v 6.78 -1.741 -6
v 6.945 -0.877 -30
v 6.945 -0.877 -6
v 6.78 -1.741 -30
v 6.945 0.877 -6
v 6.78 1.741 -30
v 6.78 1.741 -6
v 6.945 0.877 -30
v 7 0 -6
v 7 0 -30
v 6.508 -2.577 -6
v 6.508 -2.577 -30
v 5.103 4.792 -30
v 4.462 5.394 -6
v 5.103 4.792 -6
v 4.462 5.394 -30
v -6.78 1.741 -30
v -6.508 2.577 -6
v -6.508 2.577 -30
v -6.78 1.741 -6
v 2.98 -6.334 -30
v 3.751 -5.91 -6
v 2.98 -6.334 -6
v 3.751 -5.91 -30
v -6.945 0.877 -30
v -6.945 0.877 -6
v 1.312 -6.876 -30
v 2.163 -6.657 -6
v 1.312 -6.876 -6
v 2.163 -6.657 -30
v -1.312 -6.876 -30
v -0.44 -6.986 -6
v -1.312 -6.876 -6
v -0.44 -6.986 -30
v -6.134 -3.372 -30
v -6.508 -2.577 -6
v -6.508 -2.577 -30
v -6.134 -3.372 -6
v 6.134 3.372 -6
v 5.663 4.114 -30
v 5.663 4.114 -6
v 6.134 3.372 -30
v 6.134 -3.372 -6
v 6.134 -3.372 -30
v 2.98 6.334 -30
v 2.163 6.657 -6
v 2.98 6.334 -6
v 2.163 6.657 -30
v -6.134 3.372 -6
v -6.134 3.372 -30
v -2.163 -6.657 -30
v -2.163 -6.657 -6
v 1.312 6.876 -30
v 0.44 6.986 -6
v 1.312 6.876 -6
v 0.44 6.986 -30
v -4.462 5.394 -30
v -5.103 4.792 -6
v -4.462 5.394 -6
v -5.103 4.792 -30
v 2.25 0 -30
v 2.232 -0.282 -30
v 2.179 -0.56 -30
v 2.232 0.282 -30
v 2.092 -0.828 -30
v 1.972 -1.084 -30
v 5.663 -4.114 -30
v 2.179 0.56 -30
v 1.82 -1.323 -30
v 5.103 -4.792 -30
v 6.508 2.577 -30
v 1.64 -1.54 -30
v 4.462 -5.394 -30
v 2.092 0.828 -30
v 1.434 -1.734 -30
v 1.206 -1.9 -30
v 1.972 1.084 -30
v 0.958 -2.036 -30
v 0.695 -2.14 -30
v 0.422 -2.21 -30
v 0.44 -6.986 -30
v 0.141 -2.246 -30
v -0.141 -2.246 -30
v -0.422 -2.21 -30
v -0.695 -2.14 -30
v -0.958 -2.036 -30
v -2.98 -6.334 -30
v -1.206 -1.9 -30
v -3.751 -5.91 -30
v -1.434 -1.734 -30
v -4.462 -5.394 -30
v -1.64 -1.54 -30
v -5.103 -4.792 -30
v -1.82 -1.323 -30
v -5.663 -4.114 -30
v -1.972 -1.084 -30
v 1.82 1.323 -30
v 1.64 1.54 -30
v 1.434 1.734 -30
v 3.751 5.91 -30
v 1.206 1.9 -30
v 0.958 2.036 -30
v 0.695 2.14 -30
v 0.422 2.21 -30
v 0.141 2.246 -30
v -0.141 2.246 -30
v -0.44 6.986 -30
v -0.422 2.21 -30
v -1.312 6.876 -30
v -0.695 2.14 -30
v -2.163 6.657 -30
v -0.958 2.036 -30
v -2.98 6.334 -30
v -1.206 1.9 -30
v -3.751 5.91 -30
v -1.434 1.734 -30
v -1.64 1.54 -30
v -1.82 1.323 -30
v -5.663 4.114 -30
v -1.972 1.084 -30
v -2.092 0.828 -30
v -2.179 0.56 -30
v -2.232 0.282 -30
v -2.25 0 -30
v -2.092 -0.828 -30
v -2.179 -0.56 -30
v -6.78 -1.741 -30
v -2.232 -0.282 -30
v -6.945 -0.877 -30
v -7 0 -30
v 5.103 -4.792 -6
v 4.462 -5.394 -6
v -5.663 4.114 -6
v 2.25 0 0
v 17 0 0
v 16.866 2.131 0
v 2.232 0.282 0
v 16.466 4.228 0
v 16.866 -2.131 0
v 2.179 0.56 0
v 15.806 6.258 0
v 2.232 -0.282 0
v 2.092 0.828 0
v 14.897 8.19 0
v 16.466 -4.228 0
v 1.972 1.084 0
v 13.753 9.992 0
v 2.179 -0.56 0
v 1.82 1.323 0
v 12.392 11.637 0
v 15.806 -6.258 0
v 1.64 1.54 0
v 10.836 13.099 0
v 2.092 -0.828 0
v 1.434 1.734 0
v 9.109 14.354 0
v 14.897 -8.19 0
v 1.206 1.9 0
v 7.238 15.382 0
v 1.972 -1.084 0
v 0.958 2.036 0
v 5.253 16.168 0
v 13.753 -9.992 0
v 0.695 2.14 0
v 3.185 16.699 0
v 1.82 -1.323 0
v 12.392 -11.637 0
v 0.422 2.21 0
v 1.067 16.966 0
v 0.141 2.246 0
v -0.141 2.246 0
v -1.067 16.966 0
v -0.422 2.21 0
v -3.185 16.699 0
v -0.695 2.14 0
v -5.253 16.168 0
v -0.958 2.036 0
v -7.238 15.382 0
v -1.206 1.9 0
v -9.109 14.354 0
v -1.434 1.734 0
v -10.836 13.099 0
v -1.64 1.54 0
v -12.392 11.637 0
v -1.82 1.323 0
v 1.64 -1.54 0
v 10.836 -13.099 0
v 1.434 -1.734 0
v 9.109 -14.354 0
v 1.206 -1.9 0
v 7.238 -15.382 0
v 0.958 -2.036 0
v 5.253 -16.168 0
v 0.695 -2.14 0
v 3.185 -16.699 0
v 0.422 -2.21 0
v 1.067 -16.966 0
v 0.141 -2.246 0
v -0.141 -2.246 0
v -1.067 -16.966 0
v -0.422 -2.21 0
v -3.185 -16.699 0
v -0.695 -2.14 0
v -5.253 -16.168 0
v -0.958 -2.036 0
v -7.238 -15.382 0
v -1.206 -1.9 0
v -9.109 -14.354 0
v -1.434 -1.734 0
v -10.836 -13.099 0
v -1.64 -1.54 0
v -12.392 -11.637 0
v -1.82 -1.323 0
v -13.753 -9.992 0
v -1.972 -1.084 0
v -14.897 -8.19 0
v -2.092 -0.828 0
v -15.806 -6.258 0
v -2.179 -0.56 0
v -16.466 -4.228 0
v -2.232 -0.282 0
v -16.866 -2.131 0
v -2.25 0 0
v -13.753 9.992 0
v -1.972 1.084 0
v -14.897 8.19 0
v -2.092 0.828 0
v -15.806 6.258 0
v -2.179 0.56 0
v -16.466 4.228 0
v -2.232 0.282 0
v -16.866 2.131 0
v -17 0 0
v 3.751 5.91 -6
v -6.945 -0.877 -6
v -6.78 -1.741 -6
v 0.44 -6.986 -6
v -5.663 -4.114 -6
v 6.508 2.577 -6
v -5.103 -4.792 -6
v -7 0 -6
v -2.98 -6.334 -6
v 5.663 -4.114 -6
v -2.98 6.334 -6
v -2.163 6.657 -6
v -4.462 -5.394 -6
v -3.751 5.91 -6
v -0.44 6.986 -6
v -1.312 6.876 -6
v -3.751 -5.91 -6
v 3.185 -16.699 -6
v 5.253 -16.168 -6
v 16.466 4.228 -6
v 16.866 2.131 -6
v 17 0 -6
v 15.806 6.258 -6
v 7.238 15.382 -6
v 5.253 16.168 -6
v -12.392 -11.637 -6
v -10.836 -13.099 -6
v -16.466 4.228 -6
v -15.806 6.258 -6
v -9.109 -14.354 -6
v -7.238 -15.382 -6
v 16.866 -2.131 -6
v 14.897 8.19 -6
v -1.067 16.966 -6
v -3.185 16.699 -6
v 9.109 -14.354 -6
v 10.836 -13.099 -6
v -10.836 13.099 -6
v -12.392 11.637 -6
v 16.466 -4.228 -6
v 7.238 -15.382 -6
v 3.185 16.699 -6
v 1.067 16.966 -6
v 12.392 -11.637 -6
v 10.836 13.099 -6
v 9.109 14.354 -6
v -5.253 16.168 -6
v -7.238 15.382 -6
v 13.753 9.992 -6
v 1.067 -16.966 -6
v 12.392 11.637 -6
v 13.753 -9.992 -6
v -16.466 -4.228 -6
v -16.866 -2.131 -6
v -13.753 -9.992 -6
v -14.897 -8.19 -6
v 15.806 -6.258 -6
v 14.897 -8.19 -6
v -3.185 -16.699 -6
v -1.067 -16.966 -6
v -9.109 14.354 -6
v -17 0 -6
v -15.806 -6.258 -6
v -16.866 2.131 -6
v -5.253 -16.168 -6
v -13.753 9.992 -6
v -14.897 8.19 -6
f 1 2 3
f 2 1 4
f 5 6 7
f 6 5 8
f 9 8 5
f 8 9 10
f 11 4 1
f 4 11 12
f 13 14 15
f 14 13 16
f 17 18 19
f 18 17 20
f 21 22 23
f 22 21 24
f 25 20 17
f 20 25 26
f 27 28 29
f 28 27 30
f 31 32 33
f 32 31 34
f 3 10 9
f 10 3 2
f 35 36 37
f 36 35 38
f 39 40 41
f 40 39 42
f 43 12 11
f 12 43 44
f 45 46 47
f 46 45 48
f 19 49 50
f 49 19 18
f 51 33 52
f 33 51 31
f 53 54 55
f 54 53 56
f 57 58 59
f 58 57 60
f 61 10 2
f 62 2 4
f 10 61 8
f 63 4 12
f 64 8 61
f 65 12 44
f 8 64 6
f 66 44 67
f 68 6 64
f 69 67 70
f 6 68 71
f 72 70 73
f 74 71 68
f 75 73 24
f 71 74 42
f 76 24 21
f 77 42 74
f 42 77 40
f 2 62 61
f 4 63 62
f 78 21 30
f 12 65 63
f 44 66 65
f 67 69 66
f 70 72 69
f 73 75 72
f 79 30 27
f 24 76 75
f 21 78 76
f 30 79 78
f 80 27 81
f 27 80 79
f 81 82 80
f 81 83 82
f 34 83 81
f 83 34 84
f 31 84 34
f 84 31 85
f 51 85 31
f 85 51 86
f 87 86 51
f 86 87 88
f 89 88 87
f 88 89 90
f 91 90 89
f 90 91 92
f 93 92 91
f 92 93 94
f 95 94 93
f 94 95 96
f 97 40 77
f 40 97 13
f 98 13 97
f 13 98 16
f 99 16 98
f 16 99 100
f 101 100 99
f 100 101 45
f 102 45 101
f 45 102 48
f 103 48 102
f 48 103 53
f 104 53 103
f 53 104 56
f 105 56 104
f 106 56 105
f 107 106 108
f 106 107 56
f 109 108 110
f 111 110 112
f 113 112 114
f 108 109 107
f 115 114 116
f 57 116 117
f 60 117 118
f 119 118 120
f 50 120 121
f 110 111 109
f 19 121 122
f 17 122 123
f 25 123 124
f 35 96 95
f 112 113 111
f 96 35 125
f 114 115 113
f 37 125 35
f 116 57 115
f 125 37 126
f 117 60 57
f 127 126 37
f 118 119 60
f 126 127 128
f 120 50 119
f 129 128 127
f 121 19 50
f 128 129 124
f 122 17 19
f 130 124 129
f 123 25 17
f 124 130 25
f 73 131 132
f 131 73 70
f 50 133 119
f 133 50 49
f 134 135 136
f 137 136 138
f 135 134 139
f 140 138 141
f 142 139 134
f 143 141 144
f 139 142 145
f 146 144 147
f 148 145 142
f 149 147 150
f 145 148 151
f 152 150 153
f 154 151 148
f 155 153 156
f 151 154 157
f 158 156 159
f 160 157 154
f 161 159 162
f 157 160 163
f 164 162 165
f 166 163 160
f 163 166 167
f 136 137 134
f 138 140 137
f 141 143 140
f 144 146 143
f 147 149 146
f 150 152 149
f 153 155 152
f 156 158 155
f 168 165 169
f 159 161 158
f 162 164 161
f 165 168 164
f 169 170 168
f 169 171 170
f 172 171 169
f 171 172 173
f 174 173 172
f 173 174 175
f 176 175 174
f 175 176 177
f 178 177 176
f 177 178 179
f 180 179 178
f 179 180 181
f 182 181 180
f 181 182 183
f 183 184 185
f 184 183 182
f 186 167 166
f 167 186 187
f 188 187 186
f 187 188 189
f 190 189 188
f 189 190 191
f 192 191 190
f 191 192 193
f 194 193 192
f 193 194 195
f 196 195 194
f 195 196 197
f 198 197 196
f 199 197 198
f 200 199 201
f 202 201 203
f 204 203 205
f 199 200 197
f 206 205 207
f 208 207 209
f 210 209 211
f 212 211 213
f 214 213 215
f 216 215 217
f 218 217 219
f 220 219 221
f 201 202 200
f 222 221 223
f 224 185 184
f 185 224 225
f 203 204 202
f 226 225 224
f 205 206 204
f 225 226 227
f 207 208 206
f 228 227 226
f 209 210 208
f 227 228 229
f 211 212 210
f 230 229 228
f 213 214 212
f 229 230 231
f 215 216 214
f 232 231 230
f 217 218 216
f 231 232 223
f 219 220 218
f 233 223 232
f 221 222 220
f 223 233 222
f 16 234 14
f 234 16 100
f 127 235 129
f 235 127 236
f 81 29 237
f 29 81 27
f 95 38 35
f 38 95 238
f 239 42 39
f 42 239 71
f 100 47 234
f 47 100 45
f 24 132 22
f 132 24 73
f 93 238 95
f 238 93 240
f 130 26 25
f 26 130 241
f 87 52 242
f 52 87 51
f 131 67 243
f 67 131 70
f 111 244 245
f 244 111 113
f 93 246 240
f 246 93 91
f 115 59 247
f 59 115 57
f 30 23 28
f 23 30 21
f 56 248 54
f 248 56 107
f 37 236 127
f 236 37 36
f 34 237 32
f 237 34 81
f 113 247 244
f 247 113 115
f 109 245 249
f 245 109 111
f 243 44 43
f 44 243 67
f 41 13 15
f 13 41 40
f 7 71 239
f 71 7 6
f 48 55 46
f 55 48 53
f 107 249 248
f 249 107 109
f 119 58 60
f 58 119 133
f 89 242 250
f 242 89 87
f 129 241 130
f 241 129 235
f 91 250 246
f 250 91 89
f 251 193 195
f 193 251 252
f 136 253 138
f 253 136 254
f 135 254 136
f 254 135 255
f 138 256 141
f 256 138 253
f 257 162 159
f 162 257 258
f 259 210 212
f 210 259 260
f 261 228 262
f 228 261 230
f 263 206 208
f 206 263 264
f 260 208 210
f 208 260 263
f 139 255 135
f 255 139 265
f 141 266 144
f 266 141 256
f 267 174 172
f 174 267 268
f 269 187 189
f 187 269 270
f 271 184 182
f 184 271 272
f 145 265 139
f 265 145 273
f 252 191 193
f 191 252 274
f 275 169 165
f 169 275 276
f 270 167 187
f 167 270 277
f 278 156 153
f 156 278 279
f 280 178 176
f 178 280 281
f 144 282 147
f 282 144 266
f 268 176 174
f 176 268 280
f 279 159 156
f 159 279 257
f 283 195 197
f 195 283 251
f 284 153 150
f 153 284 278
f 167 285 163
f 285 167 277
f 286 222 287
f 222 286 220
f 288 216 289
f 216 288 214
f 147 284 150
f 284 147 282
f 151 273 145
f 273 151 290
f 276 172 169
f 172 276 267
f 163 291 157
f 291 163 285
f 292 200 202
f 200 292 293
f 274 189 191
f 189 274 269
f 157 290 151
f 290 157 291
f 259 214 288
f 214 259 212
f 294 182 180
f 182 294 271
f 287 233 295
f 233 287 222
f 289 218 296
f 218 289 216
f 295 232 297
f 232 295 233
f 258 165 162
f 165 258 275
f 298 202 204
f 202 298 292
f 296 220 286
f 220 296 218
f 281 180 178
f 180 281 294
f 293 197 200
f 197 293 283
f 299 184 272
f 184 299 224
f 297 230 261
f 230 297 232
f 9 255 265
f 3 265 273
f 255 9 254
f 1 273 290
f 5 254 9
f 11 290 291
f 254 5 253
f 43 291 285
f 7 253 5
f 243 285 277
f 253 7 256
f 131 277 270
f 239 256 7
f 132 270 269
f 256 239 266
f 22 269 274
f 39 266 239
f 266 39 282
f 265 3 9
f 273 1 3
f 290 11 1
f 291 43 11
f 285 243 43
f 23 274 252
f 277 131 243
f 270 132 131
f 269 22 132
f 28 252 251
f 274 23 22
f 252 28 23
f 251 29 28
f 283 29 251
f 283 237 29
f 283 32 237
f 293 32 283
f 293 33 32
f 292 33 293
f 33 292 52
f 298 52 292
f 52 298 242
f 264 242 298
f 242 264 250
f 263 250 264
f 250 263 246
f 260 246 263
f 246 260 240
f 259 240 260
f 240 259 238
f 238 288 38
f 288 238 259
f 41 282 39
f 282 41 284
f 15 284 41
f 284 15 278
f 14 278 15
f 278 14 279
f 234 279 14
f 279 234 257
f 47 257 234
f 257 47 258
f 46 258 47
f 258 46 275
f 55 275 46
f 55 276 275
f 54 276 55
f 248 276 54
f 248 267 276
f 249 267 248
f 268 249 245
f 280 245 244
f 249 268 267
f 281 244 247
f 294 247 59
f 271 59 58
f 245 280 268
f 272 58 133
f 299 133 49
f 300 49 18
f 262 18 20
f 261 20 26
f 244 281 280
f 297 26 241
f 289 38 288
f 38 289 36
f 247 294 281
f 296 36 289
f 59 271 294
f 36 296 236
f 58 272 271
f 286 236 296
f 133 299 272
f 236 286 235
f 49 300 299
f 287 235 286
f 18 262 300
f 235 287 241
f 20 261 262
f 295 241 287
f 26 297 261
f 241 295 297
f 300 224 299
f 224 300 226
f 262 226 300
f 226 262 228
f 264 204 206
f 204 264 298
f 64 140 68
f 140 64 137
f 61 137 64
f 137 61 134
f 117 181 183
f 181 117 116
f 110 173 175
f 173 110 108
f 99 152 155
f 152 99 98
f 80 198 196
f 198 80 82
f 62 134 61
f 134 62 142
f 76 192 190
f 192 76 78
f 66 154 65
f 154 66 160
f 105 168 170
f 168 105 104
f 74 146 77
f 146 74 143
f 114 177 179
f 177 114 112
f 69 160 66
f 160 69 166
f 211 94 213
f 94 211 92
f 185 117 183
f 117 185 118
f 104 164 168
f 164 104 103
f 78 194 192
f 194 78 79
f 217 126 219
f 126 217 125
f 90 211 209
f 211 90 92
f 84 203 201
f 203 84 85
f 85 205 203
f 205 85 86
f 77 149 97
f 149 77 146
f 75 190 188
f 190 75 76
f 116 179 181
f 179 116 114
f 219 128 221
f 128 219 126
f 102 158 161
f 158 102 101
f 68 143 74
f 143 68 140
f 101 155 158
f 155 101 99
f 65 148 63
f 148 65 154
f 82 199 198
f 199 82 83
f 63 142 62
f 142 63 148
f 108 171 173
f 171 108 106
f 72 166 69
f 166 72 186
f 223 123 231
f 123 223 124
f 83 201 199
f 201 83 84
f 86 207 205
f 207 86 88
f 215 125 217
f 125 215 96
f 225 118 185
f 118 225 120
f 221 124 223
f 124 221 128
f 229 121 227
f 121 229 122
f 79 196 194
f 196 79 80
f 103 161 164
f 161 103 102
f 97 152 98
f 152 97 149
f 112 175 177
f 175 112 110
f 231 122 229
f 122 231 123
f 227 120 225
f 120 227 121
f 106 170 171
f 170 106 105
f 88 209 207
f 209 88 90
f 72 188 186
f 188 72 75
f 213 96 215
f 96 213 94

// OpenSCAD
$fn = 50;


difference() {
	union() {
		translate(v = [0, 0, -30.0000000000]) {
			cylinder(h = 30, r = 7.0000000000);
		}
		translate(v = [0, 0, -6.0000000000]) {
			cylinder(h = 6, r = 17.0000000000);
		}
	}
	union() {
		#translate(v = [0, 0, -30]) {
			cylinder(h = 30, r = 2.2500000000);
		}
	}
}
